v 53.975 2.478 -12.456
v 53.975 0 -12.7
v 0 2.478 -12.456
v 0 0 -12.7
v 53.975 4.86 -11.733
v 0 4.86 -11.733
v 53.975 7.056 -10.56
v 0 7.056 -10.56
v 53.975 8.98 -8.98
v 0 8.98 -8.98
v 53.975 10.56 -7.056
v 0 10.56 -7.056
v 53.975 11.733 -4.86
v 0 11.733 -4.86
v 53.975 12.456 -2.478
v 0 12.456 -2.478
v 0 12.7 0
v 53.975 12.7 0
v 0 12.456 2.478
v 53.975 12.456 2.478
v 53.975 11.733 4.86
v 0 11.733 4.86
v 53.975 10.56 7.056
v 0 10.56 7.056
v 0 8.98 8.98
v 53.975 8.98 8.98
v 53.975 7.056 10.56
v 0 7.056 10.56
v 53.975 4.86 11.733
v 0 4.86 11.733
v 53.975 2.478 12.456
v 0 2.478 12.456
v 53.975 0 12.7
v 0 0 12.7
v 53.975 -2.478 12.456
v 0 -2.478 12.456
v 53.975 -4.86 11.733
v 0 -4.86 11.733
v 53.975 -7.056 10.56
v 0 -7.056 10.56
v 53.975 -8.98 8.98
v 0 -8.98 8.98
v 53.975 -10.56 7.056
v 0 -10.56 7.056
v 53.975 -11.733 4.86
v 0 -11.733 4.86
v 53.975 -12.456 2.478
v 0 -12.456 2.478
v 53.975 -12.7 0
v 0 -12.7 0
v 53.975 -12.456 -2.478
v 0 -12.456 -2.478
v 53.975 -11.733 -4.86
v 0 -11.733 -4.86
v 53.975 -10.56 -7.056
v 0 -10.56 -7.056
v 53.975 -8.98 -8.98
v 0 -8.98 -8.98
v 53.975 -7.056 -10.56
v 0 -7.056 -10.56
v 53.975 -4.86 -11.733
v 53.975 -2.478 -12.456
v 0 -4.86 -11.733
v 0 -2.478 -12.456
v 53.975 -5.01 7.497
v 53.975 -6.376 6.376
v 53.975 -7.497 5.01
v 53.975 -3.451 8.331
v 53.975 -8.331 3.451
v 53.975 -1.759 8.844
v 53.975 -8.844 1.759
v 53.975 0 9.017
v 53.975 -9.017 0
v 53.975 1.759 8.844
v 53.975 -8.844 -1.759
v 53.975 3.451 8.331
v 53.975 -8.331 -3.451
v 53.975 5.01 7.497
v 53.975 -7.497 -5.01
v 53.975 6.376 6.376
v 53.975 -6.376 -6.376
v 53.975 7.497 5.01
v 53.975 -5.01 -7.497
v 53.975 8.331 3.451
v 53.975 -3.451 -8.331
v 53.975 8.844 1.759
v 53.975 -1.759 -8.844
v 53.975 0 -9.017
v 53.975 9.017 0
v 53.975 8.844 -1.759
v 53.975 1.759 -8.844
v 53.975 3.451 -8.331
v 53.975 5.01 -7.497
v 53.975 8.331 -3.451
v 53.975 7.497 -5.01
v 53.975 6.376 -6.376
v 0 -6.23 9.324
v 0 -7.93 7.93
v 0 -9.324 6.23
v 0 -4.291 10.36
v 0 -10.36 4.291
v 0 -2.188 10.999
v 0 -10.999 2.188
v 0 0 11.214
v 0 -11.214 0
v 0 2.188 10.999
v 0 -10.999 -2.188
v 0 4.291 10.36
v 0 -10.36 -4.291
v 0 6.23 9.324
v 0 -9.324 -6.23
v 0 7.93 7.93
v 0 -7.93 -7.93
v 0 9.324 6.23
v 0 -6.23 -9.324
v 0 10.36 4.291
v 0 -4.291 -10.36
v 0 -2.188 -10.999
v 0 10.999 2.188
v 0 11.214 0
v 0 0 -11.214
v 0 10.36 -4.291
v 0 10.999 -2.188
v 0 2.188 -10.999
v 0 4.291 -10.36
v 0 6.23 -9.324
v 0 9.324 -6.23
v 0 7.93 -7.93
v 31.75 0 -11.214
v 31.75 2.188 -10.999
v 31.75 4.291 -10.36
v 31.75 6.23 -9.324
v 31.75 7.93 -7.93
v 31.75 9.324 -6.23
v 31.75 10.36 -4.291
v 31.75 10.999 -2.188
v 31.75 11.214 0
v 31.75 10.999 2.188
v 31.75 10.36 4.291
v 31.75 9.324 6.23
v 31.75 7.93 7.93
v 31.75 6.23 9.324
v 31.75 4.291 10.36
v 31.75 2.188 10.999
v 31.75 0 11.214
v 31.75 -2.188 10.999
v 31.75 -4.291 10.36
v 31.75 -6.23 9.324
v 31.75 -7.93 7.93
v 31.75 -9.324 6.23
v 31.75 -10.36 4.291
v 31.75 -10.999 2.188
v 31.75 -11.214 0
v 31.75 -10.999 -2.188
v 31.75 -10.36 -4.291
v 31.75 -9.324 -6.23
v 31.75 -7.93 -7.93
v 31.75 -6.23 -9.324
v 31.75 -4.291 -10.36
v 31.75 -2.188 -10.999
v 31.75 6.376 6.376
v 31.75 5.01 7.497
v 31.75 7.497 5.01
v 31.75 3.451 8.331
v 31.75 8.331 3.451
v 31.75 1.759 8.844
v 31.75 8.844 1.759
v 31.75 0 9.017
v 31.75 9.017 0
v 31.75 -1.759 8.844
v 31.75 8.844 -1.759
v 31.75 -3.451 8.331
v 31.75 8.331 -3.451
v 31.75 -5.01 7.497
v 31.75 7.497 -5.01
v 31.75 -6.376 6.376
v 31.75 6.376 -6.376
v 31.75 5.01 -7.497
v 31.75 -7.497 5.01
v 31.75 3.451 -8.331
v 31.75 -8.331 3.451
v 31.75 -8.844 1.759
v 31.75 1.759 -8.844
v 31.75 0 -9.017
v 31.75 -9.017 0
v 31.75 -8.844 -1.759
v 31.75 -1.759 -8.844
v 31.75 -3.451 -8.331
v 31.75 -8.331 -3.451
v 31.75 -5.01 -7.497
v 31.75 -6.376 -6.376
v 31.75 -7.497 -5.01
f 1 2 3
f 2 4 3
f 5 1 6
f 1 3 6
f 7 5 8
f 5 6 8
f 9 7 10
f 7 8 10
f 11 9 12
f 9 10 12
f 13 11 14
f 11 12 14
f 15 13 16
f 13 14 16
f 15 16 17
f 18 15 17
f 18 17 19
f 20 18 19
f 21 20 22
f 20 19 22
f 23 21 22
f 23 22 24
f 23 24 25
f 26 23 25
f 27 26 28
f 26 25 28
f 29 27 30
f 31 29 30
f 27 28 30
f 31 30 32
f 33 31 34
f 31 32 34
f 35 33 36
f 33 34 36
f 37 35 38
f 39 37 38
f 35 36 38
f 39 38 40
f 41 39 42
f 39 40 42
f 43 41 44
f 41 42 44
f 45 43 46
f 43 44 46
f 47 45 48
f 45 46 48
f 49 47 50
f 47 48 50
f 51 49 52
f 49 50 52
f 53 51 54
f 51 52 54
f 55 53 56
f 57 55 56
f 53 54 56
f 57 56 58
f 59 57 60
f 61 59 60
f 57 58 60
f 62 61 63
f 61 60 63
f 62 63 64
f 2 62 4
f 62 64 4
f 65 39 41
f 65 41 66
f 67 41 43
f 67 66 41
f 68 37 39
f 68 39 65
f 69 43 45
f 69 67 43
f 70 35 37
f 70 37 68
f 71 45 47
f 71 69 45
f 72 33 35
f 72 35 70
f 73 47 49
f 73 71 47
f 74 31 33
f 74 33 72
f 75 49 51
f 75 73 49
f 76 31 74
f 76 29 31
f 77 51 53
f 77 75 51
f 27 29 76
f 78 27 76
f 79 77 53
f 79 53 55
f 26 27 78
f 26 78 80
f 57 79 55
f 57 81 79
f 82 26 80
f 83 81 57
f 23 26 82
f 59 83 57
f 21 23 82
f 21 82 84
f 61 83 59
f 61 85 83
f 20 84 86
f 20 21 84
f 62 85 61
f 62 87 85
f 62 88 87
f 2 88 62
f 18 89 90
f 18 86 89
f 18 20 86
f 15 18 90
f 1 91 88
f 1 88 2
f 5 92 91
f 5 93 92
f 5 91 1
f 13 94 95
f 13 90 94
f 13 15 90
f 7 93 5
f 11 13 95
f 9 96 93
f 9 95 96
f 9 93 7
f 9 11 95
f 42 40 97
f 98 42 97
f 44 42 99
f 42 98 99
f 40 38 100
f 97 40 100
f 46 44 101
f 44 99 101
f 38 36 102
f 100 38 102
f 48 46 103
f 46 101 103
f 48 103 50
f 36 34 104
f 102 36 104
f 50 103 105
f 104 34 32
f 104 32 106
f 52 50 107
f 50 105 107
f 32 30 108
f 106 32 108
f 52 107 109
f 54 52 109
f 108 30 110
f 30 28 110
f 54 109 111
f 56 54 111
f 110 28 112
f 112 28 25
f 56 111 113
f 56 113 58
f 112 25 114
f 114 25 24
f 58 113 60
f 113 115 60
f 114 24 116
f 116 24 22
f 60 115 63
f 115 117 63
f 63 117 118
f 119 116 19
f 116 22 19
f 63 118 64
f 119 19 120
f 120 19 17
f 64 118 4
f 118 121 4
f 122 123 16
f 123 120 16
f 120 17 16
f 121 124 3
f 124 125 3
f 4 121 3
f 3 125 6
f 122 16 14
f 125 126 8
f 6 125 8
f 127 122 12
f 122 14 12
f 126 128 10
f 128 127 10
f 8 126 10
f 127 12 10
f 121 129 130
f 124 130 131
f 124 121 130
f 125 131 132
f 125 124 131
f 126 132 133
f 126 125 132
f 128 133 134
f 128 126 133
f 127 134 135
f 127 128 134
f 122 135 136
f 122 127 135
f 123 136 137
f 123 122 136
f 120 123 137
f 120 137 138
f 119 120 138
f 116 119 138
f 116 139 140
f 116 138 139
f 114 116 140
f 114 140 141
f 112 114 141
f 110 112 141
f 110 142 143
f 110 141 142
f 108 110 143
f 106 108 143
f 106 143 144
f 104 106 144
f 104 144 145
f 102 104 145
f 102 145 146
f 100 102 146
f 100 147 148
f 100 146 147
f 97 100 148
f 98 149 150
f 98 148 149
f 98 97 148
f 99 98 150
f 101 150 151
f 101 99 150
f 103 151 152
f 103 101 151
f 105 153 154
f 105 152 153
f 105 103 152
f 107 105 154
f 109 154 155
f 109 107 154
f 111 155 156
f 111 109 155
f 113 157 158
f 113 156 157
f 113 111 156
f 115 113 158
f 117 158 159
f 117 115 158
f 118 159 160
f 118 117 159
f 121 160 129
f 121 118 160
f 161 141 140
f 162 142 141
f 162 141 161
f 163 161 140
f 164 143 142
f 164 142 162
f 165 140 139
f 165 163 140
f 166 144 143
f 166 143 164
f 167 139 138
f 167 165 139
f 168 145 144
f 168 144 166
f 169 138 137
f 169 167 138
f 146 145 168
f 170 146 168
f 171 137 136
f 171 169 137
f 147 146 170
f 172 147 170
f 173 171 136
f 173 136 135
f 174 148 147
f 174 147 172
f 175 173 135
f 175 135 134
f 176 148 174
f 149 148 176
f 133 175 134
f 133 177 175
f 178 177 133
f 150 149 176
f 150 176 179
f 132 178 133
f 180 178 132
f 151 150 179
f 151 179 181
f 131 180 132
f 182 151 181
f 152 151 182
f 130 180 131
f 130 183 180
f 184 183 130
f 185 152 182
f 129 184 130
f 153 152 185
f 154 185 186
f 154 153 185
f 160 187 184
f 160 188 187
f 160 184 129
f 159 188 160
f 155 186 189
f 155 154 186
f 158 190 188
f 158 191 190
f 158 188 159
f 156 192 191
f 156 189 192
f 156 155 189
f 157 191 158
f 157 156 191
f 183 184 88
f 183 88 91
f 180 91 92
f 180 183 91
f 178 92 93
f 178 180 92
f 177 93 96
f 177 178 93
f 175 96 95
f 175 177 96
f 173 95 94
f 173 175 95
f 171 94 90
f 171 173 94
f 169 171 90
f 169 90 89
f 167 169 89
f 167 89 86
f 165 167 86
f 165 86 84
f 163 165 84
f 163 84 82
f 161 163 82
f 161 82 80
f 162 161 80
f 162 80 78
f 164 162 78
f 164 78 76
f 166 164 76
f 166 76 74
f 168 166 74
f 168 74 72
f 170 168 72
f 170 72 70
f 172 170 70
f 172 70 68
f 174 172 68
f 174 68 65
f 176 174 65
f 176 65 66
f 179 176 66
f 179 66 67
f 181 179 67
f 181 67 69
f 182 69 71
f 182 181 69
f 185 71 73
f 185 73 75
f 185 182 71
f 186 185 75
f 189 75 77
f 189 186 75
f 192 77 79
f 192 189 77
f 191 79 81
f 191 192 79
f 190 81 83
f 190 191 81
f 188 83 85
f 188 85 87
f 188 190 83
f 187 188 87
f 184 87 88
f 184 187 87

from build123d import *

# Parameters (mm, degrees)
SKETCH2_R          = 12.7
SKETCH2_R_2        = 11.2141
EXTRUDE1_DEPTH     = 28.575
SKETCH3_R          = 12.7
SKETCH3_R_2        = 9.017
EXTRUDE2_DEPTH     = 25.4
SKETCH4_R          = 11.2141
SKETCH4_R_2        = 9.017
CUT_EXTRUDE3_DEPTH = 3.175


with BuildPart() as part:
    # Sketch2 → Extrude1 (new body)
    with BuildSketch(Plane(origin=(0, 0, 0), x_dir=(0, 0, -1), z_dir=(1, 0, 0))):
        Circle(SKETCH2_R)
        Circle(SKETCH2_R_2, mode=Mode.SUBTRACT)
    extrude(amount=EXTRUDE1_DEPTH)

    # Sketch3 → Extrude2 (add)
    with BuildSketch(Plane(origin=(28.575, 0, 0), x_dir=(0, 0, -1), z_dir=(1, 0, 0))):
        Circle(SKETCH3_R)
        Circle(SKETCH3_R_2, mode=Mode.SUBTRACT)
    extrude(amount=EXTRUDE2_DEPTH)

    # Sketch4 → Cut-Extrude3 (cut)
    with BuildSketch(Plane.ZY.offset(-28.575)):
        with Locations(Location((0, 0, 0), (0, 0, 180))):  # turned: the seam where the file's is
            Circle(SKETCH4_R)
        with Locations(Location((0, 0, 0), (0, 0, 180))):  # turned: the seam where the file's is
            Circle(SKETCH4_R_2, mode=Mode.SUBTRACT)
    extrude(amount=-CUT_EXTRUDE3_DEPTH, mode=Mode.SUBTRACT)


solid = part.part
